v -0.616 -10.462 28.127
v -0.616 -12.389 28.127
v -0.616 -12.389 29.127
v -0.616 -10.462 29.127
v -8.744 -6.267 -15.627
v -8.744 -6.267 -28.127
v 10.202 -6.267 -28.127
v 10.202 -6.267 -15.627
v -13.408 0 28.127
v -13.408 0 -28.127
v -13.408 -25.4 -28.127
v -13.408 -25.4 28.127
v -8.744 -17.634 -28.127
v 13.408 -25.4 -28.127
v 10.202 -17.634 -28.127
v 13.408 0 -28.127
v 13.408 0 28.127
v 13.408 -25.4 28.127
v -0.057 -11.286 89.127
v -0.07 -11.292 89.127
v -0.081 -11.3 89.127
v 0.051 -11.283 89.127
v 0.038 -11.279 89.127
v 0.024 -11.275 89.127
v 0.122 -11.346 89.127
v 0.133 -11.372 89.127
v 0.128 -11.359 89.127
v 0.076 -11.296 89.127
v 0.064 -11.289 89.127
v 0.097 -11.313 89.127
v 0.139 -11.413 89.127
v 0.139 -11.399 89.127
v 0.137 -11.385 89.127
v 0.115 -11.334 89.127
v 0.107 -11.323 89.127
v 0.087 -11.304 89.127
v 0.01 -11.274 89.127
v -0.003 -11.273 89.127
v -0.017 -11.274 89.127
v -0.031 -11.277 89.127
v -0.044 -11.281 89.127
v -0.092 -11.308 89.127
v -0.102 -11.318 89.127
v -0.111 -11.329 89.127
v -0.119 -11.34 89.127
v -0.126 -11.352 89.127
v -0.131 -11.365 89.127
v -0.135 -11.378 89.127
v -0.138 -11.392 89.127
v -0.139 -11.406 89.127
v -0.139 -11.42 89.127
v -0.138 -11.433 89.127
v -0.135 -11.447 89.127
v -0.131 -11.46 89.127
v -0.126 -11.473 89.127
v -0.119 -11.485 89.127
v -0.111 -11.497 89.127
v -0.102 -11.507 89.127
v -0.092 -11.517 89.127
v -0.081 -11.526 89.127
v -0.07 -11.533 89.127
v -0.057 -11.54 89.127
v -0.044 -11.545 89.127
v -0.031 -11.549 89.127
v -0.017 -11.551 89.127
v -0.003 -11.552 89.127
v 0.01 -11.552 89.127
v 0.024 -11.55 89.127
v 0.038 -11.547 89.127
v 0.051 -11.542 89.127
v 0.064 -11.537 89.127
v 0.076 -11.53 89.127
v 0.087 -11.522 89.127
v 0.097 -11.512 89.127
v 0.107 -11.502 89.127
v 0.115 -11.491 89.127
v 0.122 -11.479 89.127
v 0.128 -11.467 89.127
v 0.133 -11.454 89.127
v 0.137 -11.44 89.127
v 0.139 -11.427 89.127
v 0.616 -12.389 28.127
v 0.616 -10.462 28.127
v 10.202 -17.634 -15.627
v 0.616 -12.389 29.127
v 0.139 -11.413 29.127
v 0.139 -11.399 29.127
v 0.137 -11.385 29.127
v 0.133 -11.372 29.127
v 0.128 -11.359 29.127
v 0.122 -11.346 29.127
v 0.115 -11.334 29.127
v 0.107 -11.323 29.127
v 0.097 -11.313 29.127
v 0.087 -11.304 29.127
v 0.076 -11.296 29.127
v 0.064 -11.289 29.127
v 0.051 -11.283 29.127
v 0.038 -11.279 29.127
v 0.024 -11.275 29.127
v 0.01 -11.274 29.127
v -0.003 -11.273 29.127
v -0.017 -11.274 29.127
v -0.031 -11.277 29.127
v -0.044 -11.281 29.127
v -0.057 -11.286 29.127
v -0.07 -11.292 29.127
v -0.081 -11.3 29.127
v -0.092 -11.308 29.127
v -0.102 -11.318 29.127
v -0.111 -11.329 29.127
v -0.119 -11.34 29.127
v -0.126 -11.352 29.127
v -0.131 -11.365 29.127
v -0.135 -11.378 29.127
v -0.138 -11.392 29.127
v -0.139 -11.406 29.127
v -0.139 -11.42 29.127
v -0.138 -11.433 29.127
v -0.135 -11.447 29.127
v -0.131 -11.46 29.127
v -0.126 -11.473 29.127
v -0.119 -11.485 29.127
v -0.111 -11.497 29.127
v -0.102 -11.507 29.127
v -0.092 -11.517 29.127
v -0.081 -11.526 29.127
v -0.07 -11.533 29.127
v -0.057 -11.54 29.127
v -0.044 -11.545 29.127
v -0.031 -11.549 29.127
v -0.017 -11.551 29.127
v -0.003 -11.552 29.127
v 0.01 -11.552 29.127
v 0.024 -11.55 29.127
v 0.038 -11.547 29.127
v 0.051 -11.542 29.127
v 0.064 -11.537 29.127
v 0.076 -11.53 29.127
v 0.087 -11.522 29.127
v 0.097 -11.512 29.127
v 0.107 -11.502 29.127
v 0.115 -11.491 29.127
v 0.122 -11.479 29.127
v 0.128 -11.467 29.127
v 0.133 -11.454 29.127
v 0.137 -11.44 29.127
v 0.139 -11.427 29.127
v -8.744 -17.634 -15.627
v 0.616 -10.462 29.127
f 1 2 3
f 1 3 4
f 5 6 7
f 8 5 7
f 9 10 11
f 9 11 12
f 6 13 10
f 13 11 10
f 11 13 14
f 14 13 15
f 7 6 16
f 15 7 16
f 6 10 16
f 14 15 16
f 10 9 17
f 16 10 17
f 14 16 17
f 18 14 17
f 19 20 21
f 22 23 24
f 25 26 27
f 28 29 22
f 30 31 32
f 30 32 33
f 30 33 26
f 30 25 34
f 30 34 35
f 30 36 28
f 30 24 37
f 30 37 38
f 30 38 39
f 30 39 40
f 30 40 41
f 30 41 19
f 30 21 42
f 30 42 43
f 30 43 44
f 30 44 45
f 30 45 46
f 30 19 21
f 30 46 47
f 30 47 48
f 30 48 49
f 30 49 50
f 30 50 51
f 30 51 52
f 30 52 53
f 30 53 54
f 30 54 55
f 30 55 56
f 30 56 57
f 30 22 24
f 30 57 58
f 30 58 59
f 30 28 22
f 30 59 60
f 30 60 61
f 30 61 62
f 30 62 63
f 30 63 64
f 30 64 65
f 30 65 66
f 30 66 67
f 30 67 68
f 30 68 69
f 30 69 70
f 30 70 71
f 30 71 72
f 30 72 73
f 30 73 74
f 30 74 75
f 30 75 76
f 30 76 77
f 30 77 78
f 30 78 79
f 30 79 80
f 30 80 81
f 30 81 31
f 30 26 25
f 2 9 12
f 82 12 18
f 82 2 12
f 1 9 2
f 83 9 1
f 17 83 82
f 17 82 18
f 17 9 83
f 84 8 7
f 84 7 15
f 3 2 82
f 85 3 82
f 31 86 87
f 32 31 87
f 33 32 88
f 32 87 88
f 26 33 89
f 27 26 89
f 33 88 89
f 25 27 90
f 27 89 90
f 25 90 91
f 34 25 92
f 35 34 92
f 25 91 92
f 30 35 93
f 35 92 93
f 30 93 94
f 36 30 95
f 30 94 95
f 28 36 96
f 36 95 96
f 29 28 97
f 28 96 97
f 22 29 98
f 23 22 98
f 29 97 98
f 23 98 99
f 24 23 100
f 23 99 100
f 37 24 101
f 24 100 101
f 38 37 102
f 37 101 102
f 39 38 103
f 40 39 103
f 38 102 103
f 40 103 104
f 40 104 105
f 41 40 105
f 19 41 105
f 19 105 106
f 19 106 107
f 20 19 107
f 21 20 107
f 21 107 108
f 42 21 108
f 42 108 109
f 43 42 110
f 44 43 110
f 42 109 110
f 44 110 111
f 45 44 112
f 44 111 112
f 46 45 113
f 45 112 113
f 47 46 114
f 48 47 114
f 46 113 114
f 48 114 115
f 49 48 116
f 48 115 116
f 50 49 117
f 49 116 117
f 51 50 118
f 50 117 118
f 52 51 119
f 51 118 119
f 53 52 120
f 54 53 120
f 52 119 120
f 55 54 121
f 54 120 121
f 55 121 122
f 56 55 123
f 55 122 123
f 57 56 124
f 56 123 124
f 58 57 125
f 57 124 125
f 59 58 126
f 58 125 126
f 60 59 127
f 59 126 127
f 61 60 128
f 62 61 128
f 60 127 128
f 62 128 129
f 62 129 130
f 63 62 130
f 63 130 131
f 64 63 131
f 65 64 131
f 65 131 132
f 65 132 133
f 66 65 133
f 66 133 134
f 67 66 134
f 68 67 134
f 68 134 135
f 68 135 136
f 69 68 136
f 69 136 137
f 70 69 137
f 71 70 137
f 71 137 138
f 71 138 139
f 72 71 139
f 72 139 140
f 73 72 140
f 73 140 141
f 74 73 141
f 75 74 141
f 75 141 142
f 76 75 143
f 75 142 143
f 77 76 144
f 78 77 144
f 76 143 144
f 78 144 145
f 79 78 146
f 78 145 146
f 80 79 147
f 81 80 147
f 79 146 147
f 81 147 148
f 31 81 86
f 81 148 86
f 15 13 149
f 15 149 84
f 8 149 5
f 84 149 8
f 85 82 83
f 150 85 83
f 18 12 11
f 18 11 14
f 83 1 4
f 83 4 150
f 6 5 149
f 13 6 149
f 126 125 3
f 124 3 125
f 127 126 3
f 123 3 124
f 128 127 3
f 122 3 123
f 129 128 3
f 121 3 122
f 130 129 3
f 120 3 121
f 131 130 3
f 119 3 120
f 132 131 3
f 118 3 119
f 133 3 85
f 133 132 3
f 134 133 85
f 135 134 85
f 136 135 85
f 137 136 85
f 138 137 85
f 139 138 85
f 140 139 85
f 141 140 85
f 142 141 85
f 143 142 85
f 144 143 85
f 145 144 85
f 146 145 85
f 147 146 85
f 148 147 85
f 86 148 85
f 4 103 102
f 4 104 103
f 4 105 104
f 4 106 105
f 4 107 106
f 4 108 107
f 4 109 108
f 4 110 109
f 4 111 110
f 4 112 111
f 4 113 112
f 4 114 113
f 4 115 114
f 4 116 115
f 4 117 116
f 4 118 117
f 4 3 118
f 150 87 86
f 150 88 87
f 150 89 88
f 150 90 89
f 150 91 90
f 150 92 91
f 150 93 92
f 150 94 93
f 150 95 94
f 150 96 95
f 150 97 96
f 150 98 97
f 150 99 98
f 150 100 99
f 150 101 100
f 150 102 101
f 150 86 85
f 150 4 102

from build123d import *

# Parameters (mm, degrees)
F0_W     = 26.815738529
F0_H     = 56.2547557056
F1_DEPTH = 25.4
F2_W     = 18.9459016547
F2_H     = 11.3675417379
F3_DEPTH = 12.5
F4_W     = 1.2322755065
F4_H     = 1.9270461053
F5_DEPTH = 1
F6_R     = 0.1393490387
F7_DEPTH = 60


# Not quite as in the source:
# - a feature names something its author has since deleted; it is built from what else it names


with BuildPart() as f1:
    # F0 (on Front) → F1 (new body)
    with BuildSketch(Plane.XZ):
        Rectangle(F0_W, F0_H)
    extrude(amount=F1_DEPTH)

    # F2 (on face) → F3 (cut, symmetric)
    with BuildSketch(Plane(origin=(0, 0, -28.1273778528), x_dir=(1, 0, 0), z_dir=(0, 0, -1))):
        with Locations((0.7286877371, 11.9504923932)):
            Rectangle(F2_W, F2_H)
    extrude(amount=F3_DEPTH, both=True, mode=Mode.SUBTRACT)

    # F4 (on face) → F5 (join)
    with BuildSketch(Plane.XY.offset(28.1273778528)):
        with Locations((0, -11.4252325147)):
            Rectangle(F4_W, F4_H)
    extrude(amount=F5_DEPTH)

    # F6 (on face) → F7 (join)
    with BuildSketch(Plane.XY.offset(29.1273778528)):
        with Locations((0, -11.4126661792)):
            Circle(F6_R)
    extrude(amount=F7_DEPTH)


solid = f1.part
